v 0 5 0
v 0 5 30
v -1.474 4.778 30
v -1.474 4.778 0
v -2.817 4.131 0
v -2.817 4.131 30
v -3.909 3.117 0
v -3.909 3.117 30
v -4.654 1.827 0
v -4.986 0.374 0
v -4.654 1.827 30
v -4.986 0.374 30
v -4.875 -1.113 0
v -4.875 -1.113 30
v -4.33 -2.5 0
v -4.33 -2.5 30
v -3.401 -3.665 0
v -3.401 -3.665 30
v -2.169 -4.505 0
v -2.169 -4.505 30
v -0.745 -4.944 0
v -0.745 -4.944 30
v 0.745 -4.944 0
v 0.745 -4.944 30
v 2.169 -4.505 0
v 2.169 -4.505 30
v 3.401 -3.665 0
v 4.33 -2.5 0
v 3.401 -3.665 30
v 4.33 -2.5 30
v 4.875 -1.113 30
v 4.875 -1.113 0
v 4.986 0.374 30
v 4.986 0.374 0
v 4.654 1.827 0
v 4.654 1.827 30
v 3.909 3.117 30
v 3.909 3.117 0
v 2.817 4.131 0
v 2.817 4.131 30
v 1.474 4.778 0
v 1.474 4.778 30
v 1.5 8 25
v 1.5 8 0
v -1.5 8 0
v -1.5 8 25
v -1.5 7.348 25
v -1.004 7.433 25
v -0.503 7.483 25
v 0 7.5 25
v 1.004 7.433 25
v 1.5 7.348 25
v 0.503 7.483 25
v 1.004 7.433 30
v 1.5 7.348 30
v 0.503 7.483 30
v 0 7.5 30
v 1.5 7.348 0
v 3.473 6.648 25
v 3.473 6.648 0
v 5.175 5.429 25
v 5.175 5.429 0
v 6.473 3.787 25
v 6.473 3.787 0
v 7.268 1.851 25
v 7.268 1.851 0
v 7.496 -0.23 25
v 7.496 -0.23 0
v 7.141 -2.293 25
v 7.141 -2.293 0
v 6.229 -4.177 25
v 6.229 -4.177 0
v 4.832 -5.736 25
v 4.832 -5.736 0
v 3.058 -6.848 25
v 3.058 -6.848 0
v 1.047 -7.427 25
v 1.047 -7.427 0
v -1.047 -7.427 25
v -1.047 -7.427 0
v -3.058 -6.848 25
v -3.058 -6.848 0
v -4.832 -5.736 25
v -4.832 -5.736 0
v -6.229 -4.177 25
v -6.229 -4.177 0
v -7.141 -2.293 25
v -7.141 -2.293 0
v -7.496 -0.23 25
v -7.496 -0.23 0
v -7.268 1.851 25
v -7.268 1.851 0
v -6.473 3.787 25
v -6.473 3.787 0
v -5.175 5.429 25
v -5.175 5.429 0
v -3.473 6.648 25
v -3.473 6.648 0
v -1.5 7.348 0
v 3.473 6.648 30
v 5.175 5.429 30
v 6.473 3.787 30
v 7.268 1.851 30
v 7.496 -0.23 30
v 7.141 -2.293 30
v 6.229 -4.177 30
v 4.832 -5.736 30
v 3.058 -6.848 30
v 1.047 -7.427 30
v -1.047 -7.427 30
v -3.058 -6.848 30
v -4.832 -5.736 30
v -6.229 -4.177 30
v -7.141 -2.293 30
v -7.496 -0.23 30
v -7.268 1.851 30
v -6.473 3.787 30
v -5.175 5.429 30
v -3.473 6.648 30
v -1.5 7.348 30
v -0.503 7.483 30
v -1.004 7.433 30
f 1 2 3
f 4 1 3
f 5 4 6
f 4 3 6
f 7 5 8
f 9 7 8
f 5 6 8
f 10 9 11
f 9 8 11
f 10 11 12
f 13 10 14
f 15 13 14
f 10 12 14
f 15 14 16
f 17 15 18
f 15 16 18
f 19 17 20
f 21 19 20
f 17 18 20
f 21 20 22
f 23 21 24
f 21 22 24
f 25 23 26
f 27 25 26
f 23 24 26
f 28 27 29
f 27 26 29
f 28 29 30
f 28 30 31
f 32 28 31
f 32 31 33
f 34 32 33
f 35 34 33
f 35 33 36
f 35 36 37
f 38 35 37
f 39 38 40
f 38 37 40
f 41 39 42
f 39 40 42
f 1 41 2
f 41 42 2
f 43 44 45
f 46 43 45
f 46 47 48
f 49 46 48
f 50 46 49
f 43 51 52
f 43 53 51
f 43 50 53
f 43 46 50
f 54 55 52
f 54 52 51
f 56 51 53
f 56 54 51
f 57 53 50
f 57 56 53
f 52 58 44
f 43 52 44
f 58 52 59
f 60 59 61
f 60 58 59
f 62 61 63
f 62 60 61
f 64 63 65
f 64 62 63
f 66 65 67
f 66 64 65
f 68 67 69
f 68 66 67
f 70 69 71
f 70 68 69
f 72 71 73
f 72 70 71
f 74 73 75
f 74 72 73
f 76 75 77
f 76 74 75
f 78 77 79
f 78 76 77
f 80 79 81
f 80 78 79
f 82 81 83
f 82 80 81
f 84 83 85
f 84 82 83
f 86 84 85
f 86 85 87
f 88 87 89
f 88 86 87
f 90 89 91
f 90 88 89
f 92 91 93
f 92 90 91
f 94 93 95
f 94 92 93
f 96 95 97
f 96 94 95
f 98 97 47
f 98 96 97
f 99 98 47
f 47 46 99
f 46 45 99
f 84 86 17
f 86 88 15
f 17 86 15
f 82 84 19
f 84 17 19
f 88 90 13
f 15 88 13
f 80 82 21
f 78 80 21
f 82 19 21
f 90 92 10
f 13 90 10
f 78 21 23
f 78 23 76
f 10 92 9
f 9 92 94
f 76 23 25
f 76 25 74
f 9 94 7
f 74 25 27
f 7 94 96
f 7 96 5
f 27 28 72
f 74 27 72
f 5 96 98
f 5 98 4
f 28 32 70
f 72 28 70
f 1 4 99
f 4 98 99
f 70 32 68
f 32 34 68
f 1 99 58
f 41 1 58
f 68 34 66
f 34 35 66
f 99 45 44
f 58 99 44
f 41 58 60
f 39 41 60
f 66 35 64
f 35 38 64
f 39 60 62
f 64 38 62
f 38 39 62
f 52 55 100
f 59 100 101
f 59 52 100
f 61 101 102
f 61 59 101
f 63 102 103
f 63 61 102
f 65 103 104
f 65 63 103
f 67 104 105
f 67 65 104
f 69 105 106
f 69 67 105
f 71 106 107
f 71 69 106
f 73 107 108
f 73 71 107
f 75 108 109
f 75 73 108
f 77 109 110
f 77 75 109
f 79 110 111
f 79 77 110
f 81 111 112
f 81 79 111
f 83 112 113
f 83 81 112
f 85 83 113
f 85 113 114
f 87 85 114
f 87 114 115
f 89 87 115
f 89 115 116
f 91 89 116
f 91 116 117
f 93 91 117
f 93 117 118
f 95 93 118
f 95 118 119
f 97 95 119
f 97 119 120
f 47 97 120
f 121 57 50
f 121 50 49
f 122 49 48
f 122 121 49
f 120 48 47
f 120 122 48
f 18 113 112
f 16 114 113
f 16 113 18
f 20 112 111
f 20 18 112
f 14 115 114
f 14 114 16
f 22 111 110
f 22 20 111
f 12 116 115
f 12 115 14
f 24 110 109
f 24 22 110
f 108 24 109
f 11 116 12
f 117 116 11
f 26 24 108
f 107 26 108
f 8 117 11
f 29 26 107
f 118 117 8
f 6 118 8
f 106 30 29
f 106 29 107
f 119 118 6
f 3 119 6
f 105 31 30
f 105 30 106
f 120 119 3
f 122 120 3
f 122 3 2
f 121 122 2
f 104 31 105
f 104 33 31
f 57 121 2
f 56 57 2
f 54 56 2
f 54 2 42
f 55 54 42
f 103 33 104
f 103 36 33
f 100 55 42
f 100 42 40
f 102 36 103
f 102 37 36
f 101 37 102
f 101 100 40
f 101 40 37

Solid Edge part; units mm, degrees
sketch "Sketch1" plane through (0, 0, 0) normal (0, 0, 1) x (1, 0, 0)
  line L0 (1.5, 8) -> (-1.5, 8)
  line L1 (-1.5, 8) -> (-1.5, 7)
  line L2 (-1.5, 7) -> (1.5, 7)
  line L3 (1.5, 7) -> (1.5, 8)
  circle A0 centre (0, 0) radius 7.5
  dimension "D1" = 6.5
  dimension "D2" = 1
  dimension "D3" = 3
extrude "Protrusion1" add sketch "Sketch1" along normal blind 30
sketch "Sketch2" plane through (0, 0, 30) normal (0, 0, 1) x (0, 1, 0)
  circle A0 centre (0, 0) radius 9
  circle A1 centre (0, 0) radius 7.5
  dimension "D1" = 18
  dimension "D2" = 15
extrude "ExtrudedCutout_3" cut sketch "Sketch2" against normal blind 5
sketch "Sketch3" plane through (0, -0.5, 30) normal (0, 0, 1) x (0, 1, 0)
  circle A0 centre (0.5, 0) radius 5
  dimension "D1" = 10
extrude "Cutout1" cut sketch "Sketch3" against normal up to next
extrude "ExtrudedCutout_7" [suppressed]
properties material "Stainless steel"
